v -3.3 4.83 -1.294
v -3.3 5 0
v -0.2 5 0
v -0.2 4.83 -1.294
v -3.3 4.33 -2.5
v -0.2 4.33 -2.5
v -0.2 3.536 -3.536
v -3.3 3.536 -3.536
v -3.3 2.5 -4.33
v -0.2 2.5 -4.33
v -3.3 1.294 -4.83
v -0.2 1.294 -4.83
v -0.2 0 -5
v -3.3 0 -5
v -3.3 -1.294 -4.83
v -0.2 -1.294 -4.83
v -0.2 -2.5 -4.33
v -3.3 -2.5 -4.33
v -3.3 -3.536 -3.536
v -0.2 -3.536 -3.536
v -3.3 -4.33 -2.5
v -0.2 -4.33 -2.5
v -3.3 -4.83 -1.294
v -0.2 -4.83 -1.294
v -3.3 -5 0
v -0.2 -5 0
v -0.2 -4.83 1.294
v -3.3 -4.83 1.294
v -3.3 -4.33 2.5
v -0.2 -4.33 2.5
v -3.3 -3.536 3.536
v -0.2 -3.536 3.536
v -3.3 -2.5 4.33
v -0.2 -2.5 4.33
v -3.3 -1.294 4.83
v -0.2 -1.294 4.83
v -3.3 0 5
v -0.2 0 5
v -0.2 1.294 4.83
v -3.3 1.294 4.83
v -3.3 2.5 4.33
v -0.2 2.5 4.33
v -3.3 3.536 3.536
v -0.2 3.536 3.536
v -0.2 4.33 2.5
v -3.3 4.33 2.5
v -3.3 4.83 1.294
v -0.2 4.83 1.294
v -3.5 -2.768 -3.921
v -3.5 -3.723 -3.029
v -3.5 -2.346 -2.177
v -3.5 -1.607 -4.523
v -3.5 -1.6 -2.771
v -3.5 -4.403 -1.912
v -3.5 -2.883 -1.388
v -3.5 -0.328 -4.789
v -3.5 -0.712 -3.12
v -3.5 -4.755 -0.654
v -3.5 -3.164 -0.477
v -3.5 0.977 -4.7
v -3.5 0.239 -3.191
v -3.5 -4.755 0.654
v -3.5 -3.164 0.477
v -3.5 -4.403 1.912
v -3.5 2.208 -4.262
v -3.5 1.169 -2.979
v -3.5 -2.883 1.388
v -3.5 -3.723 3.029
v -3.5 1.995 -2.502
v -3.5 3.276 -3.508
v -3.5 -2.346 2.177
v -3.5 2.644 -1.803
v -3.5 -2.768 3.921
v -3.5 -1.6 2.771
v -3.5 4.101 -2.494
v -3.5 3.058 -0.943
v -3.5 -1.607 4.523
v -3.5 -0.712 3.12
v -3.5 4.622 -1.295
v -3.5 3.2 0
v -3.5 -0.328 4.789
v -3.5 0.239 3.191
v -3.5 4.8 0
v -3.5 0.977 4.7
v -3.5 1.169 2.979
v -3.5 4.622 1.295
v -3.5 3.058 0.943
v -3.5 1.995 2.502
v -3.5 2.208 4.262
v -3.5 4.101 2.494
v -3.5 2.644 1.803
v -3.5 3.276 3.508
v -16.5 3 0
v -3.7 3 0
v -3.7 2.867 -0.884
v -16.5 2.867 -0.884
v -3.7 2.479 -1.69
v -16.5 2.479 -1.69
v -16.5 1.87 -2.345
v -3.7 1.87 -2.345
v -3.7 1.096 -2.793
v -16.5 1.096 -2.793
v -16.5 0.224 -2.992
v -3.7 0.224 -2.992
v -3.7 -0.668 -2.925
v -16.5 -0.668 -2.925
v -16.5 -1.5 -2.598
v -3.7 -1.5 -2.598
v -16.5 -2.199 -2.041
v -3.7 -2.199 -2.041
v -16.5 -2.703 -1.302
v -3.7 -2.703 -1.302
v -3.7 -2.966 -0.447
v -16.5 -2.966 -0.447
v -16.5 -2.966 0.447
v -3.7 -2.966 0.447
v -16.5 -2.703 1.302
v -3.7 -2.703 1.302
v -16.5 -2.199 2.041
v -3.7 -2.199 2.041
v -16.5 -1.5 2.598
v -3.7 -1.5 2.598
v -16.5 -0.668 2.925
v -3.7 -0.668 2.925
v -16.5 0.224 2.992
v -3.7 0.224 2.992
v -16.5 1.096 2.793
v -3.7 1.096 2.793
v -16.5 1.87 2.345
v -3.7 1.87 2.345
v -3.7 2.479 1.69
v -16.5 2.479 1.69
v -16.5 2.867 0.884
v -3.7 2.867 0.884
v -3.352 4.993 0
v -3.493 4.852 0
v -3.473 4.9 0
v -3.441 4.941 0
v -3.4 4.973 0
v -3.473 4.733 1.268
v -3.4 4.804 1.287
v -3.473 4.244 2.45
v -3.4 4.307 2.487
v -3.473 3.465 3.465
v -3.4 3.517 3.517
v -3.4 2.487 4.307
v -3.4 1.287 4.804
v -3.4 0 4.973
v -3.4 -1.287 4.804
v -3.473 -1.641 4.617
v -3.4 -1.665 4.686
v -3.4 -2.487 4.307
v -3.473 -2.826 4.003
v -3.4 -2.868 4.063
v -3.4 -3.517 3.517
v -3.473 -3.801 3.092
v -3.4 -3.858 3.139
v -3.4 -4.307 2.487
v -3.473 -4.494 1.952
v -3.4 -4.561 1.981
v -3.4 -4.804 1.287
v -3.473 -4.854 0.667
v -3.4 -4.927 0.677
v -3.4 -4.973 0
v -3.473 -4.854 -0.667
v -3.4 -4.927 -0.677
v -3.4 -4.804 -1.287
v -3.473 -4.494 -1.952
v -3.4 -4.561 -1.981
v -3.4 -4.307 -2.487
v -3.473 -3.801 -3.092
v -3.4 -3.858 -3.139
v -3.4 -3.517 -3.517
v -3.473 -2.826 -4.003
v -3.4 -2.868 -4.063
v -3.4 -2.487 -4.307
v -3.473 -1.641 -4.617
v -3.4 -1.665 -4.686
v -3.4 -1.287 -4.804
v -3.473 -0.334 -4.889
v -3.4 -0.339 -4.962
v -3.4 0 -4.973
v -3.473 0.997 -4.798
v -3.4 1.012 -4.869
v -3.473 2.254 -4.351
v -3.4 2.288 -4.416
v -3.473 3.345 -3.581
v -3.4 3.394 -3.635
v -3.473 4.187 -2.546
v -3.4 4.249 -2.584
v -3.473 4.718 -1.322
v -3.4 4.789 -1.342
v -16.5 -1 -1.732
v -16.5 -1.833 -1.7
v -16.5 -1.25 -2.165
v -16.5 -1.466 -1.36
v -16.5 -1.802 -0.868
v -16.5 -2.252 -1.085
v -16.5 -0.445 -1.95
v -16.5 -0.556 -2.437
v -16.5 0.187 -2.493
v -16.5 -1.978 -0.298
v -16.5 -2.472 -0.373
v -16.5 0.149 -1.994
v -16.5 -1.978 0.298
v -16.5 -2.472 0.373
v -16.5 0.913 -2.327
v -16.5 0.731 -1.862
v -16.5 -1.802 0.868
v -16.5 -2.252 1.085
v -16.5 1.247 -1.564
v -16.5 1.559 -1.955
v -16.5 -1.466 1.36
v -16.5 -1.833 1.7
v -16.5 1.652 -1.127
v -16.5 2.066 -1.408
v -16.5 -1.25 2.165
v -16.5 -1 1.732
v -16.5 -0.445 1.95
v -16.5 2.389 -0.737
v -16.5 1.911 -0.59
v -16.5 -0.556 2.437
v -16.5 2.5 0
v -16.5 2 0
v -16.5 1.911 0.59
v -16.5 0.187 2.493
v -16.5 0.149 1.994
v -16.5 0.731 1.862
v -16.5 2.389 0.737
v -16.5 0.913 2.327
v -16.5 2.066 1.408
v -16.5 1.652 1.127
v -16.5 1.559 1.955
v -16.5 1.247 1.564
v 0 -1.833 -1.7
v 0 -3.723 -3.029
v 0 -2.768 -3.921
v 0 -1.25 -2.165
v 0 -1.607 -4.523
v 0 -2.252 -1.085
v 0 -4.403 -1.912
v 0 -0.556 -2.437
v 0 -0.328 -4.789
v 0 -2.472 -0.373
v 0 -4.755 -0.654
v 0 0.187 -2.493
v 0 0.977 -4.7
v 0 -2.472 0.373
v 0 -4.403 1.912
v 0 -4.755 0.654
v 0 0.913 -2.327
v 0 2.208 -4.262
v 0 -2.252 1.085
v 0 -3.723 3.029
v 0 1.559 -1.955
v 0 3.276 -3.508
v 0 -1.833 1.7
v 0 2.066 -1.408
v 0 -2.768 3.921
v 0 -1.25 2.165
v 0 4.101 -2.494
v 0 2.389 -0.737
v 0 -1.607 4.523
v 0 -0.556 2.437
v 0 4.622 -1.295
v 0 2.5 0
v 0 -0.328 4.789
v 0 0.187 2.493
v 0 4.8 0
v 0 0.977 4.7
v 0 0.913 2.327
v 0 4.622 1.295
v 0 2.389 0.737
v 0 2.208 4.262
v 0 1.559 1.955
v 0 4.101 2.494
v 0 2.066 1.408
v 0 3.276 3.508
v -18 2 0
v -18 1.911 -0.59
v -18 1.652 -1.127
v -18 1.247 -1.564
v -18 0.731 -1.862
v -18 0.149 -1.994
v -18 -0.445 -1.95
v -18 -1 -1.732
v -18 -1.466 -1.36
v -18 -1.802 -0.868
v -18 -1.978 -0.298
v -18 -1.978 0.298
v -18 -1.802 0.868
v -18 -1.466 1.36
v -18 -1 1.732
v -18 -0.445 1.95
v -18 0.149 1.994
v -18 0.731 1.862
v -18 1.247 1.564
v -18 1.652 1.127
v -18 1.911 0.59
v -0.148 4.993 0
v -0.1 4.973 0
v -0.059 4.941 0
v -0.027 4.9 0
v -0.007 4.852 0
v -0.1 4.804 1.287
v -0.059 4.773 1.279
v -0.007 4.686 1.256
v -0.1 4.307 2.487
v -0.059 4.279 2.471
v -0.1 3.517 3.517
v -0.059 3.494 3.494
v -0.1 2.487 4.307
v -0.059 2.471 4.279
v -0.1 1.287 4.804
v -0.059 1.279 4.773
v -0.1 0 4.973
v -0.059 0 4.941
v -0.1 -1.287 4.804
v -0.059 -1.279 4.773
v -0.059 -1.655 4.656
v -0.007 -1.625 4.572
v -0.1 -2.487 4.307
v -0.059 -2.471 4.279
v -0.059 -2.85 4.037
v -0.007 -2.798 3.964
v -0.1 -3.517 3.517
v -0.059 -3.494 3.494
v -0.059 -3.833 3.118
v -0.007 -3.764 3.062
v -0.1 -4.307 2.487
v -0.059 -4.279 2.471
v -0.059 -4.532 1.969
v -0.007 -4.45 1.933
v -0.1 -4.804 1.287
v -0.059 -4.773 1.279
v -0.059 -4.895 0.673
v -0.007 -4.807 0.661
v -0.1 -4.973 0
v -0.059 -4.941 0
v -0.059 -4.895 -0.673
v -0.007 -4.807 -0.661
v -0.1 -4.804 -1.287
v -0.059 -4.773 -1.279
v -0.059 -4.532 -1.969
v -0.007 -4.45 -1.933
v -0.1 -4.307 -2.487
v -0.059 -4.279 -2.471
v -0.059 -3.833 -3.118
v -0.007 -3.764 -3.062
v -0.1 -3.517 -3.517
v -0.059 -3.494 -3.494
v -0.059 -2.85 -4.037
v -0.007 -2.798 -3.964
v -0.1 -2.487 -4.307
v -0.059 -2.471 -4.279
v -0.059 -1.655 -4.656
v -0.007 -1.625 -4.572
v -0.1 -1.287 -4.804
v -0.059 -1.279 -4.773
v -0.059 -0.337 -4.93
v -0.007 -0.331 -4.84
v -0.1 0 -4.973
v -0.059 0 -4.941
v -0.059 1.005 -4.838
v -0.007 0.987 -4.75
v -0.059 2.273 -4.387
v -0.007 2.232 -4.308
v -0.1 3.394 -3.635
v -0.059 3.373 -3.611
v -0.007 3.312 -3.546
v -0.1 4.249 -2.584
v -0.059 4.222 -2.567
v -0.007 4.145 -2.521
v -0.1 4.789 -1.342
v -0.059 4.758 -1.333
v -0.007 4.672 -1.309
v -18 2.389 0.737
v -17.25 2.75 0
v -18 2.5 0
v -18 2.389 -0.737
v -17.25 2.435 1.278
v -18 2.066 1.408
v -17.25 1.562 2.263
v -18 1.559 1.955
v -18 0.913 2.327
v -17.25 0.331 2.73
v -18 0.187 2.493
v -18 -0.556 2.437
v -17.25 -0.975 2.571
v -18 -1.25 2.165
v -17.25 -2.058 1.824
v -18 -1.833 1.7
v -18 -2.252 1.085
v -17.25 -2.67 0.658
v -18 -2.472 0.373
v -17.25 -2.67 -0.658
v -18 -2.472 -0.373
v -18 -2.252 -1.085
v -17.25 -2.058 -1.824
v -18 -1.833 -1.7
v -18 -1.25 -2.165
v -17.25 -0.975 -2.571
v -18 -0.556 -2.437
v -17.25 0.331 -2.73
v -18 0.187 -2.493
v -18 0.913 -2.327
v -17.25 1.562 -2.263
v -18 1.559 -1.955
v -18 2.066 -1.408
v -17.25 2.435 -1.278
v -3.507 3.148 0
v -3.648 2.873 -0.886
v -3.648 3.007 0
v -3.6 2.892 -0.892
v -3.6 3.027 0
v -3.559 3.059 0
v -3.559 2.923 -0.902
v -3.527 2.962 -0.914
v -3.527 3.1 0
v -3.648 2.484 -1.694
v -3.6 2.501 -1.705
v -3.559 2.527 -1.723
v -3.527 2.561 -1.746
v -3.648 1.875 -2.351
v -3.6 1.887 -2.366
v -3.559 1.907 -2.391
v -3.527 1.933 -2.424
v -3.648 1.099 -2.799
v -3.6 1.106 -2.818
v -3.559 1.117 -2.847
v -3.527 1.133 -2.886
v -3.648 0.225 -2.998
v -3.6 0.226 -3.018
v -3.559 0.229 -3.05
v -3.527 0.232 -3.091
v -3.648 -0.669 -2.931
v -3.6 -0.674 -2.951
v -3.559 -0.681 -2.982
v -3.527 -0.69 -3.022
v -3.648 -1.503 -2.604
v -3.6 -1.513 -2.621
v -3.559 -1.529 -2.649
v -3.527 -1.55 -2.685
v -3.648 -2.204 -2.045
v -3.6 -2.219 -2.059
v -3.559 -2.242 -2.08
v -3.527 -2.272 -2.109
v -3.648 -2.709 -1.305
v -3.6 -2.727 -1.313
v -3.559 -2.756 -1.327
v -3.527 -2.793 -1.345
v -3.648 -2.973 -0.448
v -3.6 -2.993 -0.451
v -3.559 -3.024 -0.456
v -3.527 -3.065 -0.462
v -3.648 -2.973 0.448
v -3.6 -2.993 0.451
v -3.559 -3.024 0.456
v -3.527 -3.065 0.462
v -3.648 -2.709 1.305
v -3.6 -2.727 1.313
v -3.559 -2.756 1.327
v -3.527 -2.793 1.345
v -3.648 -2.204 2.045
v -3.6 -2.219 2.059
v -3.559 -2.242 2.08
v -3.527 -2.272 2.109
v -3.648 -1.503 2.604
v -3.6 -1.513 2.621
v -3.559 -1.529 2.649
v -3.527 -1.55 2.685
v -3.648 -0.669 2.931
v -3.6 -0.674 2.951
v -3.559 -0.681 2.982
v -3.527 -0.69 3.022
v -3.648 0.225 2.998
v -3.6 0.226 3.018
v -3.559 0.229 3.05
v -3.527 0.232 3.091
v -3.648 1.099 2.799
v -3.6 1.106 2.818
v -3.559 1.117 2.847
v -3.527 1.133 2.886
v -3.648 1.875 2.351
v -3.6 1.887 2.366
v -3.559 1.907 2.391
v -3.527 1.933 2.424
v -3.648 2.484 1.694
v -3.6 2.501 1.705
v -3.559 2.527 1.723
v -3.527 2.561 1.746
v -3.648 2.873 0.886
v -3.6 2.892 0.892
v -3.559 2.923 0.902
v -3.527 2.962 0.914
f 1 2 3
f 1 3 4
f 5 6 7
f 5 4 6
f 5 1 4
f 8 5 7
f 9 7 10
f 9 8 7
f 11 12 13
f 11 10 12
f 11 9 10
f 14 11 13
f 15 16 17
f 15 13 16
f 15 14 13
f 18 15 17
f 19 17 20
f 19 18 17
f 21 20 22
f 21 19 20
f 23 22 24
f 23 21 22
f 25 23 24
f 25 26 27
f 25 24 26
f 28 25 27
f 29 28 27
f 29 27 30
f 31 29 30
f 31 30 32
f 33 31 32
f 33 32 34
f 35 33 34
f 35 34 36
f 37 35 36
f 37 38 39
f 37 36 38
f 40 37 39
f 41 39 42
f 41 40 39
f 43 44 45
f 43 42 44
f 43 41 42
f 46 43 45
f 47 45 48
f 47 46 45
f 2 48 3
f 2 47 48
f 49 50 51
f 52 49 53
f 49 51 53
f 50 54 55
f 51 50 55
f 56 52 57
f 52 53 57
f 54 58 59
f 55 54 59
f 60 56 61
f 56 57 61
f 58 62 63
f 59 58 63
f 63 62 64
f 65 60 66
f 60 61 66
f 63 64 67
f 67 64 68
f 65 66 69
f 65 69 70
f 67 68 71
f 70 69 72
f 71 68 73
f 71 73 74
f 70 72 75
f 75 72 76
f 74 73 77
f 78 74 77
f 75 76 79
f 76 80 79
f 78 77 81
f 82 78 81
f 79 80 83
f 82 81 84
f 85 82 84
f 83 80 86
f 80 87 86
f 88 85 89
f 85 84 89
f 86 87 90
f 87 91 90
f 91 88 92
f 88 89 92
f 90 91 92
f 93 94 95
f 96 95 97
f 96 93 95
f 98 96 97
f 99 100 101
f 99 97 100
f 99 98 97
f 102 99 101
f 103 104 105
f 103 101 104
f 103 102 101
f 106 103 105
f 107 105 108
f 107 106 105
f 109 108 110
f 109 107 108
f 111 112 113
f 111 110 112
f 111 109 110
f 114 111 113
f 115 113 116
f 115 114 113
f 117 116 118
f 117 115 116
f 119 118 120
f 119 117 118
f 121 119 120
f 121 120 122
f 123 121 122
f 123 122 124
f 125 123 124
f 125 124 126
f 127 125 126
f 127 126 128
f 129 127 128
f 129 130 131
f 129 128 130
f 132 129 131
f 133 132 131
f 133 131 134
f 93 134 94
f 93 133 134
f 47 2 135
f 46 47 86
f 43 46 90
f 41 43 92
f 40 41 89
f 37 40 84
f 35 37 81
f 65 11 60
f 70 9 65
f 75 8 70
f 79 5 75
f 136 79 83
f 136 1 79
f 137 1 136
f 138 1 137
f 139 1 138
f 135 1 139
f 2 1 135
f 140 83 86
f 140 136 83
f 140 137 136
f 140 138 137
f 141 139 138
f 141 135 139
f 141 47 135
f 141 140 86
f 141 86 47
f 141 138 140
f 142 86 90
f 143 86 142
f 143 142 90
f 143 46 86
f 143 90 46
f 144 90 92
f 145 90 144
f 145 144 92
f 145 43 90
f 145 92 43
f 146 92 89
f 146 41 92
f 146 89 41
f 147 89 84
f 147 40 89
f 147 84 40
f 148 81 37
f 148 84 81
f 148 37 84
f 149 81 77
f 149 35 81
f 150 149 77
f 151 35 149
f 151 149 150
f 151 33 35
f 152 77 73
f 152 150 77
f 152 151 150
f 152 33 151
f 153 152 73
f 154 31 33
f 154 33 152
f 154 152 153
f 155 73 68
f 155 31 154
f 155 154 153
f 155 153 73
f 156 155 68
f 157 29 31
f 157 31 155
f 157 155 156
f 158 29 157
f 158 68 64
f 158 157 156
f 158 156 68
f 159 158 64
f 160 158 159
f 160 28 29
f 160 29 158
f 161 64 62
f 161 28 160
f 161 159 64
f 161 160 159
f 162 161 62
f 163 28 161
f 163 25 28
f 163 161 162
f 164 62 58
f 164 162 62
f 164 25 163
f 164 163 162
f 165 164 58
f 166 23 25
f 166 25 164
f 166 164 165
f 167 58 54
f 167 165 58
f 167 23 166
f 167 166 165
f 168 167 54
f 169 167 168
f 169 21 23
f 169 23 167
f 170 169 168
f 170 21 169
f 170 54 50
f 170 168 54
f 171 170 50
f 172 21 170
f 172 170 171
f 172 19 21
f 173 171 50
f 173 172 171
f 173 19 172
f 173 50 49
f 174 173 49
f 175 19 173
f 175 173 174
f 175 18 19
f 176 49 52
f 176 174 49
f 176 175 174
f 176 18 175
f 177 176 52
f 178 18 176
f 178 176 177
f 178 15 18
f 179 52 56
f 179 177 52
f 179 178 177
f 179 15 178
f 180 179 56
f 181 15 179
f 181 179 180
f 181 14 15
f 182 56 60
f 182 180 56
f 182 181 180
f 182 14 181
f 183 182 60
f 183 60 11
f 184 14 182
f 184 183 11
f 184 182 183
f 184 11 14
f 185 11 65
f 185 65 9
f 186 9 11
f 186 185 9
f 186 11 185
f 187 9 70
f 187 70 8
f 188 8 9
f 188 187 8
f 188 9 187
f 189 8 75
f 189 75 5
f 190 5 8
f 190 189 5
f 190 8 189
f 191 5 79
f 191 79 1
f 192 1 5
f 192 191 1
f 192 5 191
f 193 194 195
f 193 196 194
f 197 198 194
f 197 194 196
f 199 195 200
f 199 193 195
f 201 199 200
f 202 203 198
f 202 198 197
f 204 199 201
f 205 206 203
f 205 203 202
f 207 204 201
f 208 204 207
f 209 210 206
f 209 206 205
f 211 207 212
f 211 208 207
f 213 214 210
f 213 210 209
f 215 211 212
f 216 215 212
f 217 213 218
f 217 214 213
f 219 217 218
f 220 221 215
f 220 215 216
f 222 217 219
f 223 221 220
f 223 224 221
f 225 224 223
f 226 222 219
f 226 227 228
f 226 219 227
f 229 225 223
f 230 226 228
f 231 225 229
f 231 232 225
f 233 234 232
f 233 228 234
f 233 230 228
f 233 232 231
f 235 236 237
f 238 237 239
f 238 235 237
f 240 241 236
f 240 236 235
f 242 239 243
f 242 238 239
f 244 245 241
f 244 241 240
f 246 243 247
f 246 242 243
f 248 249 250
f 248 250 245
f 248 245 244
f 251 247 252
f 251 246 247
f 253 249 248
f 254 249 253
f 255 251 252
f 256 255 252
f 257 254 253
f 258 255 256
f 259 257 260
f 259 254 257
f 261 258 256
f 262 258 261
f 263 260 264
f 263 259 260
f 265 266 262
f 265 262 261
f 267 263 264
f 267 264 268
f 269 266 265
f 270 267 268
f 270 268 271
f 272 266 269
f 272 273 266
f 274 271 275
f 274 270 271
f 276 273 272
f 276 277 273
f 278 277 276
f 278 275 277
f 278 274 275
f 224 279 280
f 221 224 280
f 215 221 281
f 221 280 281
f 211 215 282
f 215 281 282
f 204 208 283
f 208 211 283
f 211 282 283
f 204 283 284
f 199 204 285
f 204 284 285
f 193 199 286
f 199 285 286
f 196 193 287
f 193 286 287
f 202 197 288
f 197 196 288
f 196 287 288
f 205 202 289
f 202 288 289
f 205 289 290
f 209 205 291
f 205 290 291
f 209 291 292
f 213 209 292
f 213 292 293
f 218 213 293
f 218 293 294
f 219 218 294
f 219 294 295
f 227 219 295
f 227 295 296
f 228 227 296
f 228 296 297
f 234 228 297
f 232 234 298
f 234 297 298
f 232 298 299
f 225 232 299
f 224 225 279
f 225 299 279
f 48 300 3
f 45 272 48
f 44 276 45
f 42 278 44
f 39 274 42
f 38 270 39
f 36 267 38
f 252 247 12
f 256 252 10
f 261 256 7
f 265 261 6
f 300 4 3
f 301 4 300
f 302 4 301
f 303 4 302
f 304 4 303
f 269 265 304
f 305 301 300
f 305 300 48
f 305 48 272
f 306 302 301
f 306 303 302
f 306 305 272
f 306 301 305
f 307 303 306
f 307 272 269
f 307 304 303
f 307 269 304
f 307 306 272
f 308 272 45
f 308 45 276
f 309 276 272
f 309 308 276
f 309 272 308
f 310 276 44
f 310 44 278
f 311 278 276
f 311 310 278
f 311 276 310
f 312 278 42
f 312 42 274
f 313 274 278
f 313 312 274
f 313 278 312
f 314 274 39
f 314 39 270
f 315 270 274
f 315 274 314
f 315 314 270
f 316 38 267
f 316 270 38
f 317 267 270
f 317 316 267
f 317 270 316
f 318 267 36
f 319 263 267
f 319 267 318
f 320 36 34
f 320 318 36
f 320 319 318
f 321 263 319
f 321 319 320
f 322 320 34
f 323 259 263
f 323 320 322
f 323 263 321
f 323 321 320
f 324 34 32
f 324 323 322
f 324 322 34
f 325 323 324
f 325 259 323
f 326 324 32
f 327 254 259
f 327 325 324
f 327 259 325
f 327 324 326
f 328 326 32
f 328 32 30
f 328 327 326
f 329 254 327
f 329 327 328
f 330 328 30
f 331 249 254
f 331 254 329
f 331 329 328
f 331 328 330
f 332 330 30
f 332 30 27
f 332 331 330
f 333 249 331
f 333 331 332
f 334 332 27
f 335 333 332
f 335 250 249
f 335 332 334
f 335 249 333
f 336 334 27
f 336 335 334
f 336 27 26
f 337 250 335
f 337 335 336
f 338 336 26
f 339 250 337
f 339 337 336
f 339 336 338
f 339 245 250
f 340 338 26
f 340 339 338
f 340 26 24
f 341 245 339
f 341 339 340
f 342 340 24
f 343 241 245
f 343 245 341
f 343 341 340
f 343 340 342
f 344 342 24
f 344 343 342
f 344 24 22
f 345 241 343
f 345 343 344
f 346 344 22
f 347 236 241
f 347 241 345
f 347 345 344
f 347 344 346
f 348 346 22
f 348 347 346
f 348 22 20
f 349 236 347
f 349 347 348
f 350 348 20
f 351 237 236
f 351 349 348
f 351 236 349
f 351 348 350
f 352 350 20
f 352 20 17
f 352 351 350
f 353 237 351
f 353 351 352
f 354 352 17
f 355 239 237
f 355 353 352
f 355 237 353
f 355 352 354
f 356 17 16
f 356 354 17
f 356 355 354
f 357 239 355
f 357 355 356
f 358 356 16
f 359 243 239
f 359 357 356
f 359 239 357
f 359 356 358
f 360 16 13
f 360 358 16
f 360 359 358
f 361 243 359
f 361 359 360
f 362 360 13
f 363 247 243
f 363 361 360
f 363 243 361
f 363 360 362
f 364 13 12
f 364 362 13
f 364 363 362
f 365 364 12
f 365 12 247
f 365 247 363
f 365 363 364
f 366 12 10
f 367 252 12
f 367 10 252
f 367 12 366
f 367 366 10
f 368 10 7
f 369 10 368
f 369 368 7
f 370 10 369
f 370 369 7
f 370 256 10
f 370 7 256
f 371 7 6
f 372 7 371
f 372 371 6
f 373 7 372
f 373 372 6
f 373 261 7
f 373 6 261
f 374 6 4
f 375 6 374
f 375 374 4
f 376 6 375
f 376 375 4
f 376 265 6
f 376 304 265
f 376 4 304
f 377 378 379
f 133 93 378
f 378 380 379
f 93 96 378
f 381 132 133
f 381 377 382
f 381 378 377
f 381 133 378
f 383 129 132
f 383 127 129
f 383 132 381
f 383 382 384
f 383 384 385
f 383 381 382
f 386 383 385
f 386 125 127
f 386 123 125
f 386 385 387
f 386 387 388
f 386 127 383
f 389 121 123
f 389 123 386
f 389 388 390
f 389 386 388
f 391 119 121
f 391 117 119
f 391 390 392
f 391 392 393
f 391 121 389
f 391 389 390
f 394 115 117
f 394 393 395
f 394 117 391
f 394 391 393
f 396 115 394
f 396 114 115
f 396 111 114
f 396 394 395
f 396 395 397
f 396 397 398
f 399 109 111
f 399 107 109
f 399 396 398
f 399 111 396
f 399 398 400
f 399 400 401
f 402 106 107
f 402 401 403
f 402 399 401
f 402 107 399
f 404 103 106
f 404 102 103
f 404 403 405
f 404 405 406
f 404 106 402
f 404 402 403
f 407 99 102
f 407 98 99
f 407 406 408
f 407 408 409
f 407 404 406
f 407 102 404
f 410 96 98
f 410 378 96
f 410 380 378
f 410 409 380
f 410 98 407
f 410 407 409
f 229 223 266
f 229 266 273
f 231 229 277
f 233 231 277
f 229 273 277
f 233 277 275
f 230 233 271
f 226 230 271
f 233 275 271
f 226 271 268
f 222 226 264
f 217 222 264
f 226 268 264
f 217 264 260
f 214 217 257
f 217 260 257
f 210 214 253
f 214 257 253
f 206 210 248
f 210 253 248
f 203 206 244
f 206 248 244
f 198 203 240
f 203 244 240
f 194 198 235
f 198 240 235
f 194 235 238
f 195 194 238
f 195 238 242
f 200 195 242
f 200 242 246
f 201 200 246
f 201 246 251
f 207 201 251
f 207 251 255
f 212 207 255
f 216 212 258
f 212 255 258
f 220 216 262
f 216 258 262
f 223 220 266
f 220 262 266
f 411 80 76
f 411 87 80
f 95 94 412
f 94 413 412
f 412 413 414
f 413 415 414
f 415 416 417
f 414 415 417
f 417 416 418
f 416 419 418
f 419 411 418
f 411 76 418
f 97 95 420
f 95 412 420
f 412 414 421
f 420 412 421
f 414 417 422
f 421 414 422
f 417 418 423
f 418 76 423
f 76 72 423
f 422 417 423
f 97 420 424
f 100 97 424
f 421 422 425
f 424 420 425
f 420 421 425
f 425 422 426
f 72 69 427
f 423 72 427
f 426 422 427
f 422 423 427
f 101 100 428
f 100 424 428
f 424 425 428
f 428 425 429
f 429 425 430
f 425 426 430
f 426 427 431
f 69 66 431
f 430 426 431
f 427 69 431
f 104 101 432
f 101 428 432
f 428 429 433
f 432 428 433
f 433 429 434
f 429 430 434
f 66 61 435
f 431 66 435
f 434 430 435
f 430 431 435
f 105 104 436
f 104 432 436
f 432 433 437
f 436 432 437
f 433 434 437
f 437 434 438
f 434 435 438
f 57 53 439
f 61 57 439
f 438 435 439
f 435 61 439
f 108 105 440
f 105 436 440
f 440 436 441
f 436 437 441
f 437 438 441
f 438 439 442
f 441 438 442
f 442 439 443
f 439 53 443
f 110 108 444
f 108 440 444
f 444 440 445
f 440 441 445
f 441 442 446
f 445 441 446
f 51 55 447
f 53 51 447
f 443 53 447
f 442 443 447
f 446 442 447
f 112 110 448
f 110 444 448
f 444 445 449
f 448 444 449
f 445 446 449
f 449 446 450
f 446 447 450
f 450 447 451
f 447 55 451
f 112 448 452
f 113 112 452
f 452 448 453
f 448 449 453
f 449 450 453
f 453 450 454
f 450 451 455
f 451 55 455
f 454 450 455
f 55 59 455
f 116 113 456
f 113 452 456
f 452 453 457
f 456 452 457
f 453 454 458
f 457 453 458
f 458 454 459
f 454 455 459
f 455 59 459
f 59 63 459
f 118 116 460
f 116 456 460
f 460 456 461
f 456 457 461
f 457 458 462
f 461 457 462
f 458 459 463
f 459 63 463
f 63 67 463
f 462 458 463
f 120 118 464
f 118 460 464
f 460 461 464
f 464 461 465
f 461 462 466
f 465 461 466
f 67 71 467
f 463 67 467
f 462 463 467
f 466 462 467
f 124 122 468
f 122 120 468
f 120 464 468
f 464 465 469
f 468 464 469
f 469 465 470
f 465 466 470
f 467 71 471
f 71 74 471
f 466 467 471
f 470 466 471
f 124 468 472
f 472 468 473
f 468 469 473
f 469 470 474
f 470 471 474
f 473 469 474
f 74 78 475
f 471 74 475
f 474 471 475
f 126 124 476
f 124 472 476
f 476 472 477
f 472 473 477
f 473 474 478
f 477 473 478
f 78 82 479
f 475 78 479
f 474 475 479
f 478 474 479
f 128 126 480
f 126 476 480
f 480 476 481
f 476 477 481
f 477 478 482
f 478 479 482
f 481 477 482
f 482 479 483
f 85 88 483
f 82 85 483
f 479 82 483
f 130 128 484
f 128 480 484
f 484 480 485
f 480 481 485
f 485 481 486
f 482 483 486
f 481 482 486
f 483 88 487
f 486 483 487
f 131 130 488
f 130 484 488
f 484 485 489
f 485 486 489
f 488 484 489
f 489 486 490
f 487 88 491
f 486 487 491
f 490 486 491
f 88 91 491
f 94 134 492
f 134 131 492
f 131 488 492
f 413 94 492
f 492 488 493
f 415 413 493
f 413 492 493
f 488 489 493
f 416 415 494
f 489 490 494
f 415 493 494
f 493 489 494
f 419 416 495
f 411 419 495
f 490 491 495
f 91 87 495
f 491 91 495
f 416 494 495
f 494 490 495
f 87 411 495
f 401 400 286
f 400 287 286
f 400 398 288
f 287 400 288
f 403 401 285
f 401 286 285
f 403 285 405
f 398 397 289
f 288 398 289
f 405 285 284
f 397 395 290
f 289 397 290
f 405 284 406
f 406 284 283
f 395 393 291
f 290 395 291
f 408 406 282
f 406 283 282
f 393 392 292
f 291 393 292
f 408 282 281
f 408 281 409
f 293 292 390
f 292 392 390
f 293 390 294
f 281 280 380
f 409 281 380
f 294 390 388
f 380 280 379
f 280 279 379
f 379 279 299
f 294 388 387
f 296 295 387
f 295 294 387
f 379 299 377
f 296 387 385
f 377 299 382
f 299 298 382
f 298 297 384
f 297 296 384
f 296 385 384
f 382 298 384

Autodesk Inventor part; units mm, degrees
ref_plane "YZ Plane" through (0, 0, 0) normal (1, 0, 0) x (0, 1, 0)
ref_plane "XZ Plane" through (0, 0, 0) normal (0, 1, 0) x (-1, 0, 0)
ref_plane "XY Plane" through (0, 0, 0) normal (0, 0, 1) x (1, 0, 0)
sketch "Skizze1" plane through (0, 0, 0) normal (0, 0, 1) x (1, 0, 0)
  line L0 (-16.5, 2.5) -> (0, 2.5)
  line L1 (0, 5) -> (-3.5, 5)
  line L2 (0, 5) -> (0, 2.5)
  line L3 (-3.5, 5) -> (-3.5, 3)
  line L4 (-3.5, 3) -> (-16.5, 3)
  line L5 (-18, 2.5) -> (-16.5, 3)
  line L6 (-16.5, 2) -> (-18, 2)
  line L7 (-16.5, 2) -> (-16.5, 2.5)
  line L8 (-18, 2.5) -> (-18, 2)
  line L9 (0, 1.4) -> (0, 5.6) projected
  line L10 (-21.6, 0) -> (3.6, 0) projected
  dimension "d0" = 5
  dimension "d1" = 10
  dimension "d2" = 6
  dimension "d3" = 1.5
  dimension "d4" = 4
  dimension "d5" = 18
  dimension "d6" = 3.5
  dimension "d7" = 161.565
revolve "Umdrehung1" add sketch "Skizze1" angle 360 about axis through (-10, 0, 0) along (1, 0, 0)
thread "Gewinde1" size "M10x0.5" class "6g" standard "ISO Metric profile" full length
fillet "Rundung1" radius 0.2 3 edges at (-3.5, -3, 0) (-3.5, -5, 0) (0, -5, 0)
properties part number "YTP-AP-E12-R1.0"
